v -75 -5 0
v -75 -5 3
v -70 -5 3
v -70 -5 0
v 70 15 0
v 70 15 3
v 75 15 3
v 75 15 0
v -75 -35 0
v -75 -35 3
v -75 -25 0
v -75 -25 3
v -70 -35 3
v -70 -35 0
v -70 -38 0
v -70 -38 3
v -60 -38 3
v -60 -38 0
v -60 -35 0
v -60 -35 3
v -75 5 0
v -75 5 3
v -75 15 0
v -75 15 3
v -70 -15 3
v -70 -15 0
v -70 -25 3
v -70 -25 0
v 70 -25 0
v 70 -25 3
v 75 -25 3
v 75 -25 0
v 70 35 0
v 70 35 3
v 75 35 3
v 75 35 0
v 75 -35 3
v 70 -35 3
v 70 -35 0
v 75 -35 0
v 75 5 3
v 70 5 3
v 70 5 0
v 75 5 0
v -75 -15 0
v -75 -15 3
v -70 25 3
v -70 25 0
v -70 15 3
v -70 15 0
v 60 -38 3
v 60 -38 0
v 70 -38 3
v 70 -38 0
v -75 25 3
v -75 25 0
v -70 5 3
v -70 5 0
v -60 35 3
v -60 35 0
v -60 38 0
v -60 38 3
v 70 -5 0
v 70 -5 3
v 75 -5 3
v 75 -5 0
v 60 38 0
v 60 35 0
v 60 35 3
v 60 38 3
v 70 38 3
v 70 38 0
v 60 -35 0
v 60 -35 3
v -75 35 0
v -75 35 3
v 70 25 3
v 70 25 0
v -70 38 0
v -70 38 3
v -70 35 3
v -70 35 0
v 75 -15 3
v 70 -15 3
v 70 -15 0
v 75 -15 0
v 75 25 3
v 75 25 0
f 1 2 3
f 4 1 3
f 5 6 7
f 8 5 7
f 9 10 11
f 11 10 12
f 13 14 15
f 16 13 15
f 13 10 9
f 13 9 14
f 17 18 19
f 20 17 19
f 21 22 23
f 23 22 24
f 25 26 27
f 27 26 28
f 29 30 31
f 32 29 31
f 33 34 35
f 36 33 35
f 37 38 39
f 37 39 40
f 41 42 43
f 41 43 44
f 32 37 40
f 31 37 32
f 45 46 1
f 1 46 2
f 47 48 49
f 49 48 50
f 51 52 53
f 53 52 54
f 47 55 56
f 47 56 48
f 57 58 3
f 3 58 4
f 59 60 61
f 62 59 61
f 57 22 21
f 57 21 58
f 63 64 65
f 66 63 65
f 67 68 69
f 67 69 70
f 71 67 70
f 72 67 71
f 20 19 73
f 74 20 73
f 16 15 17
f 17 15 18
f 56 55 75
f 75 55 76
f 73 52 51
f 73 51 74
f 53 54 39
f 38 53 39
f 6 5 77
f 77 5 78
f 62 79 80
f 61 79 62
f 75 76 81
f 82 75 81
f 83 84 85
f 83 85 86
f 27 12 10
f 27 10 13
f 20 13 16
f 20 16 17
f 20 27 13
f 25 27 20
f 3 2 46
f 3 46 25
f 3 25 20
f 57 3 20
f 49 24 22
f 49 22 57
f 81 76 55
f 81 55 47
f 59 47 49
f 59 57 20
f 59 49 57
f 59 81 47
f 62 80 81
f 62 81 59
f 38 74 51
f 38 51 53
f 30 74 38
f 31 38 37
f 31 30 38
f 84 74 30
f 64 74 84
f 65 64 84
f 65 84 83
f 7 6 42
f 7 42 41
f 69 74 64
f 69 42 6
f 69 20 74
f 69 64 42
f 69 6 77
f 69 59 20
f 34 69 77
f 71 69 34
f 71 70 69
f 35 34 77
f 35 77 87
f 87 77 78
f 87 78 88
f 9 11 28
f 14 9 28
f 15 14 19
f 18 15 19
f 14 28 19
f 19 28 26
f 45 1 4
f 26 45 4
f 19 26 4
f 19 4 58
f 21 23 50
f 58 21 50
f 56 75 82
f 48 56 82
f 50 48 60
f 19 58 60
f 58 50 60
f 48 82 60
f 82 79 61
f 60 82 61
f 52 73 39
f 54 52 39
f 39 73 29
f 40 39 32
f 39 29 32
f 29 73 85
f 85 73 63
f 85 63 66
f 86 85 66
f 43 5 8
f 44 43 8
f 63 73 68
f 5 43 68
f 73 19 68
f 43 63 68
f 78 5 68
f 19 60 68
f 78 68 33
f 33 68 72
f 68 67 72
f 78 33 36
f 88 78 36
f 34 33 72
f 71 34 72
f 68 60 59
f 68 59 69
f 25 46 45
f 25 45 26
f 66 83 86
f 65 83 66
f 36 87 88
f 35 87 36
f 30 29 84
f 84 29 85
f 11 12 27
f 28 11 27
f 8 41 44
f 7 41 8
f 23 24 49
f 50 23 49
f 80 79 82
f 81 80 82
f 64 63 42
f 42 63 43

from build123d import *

# Parameters (mm, degrees)
ESBO_O1_W                = 10
ESBO_O1_H                = 3
ESBO_O1_W_2              = 140
ESBO_O1_H_2              = 70
RESSALTO_EXTRUS_O1_DEPTH = 3
ESBO_O2_W                = 5
ESBO_O2_H                = 10
RESSALTO_EXTRUS_O2_DEPTH = 3


with BuildPart() as part:
    # Esboço1 → Ressalto-extrusão1 (new body)
    with BuildSketch(Plane.XY):
        with Locations((-65, 36.5)):
            Rectangle(ESBO_O1_W, ESBO_O1_H)
        with Locations((65, -36.5)):
            Rectangle(ESBO_O1_W, ESBO_O1_H)
        with Locations((-65, -36.5)):
            Rectangle(ESBO_O1_W, ESBO_O1_H)
        Rectangle(ESBO_O1_W_2, ESBO_O1_H_2)
        with Locations((65, 36.5)):
            Rectangle(ESBO_O1_W, ESBO_O1_H)
    extrude(amount=RESSALTO_EXTRUS_O1_DEPTH)

    # Esboço2 → Ressalto-extrusão2 (add)
    with BuildSketch(Plane.XY.offset(3)):
        with Locations((-72.5, -30)):
            Rectangle(ESBO_O2_W, ESBO_O2_H)
        with Locations((-72.5, -10)):
            Rectangle(ESBO_O2_W, ESBO_O2_H)
        with Locations((-72.5, 10)):
            Rectangle(ESBO_O2_W, ESBO_O2_H)
        with Locations((-72.5, 30)):
            Rectangle(ESBO_O2_W, ESBO_O2_H)
        with Locations((72.5, 30)):
            Rectangle(ESBO_O2_W, ESBO_O2_H)
        with Locations((72.5, 10)):
            Rectangle(ESBO_O2_W, ESBO_O2_H)
        with Locations((72.5, -10)):
            Rectangle(ESBO_O2_W, ESBO_O2_H)
        with Locations((72.5, -30)):
            Rectangle(ESBO_O2_W, ESBO_O2_H)
    extrude(amount=-RESSALTO_EXTRUS_O2_DEPTH)


solid = part.part
